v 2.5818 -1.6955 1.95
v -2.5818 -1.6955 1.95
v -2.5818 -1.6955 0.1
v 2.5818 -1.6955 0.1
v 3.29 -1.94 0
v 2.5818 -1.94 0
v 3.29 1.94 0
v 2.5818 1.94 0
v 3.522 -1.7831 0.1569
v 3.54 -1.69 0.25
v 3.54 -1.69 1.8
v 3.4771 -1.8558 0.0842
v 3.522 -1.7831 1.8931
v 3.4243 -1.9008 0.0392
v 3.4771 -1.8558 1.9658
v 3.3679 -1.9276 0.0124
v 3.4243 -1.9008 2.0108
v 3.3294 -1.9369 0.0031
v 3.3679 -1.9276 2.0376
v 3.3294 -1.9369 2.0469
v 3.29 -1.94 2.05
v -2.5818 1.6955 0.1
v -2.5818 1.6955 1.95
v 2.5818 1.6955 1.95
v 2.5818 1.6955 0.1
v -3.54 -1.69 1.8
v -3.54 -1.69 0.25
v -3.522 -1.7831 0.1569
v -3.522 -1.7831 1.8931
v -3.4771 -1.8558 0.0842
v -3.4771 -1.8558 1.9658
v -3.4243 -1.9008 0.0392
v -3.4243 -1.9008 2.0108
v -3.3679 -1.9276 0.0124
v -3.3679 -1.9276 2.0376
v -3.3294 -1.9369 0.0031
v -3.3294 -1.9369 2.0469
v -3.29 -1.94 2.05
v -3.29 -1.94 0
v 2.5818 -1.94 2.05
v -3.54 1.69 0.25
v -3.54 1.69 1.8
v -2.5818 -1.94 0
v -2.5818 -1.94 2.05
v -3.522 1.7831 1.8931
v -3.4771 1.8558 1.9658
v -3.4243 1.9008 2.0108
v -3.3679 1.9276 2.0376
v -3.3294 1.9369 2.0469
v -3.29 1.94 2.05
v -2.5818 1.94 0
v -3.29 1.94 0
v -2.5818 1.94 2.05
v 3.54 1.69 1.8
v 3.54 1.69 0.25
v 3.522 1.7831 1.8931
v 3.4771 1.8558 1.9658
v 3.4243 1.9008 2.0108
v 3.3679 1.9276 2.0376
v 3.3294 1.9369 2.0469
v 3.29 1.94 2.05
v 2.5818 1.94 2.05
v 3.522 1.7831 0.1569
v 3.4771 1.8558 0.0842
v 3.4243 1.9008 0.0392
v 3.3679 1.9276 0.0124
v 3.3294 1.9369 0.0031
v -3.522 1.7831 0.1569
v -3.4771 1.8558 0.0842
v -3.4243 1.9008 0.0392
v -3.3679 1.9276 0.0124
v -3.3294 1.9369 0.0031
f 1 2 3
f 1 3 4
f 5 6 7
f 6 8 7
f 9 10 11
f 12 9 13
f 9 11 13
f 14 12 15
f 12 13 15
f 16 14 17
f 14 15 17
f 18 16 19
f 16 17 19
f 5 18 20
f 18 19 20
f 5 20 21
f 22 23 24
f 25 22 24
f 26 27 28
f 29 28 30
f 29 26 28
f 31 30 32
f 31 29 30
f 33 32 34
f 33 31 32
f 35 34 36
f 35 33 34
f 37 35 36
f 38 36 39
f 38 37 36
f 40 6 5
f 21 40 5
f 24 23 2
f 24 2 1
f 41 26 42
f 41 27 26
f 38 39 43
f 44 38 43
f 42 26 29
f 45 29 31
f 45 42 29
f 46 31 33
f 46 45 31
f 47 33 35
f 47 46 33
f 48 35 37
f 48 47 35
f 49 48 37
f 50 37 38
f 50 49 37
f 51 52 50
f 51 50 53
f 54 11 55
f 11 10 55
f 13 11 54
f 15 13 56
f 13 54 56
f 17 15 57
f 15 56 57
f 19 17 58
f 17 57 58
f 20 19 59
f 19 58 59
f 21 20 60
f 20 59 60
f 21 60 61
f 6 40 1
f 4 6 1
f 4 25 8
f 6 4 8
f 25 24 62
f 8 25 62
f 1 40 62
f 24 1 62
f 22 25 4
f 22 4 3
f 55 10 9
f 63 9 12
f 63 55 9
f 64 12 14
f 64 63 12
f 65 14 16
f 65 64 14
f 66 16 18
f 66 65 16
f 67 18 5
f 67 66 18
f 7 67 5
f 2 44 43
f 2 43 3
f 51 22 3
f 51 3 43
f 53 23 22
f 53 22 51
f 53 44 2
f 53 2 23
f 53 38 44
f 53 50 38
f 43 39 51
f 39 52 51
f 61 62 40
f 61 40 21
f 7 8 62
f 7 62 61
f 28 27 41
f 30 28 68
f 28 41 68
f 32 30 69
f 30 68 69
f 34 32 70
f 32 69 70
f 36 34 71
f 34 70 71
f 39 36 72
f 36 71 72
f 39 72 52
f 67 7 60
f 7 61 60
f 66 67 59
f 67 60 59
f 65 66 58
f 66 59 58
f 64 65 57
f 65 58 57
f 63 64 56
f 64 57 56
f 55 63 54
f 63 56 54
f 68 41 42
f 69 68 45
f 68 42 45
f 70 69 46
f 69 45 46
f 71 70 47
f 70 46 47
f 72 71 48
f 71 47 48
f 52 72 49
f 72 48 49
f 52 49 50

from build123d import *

# Parameters (mm, degrees)
ESQUISSE1_W             = 7.08
ESQUISSE1_H             = 3.88
BOSS_EXTRU_1_DEPTH      = 2.05
ESQUISSE3_W             = 5.163612044
ESQUISSE3_H             = 0.48908098
ENL_V_MAT_EXTRU_1_DEPTH = 2.05
ESQUISSE4_W             = 5.163612044
ESQUISSE4_H             = 3.39091902
ENL_V_MAT_EXTRU_2_DEPTH = 0.1
ESQUISSE5_W             = 5.163612044
ESQUISSE5_H             = 3.39091902
ENL_V_MAT_EXTRU_3_DEPTH = 0.1
CONG_1_R                = 0.25


with BuildPart() as part:
    # Esquisse1 → Boss.-Extru.1 (new body)
    with BuildSketch(Plane.XY):
        Rectangle(ESQUISSE1_W, ESQUISSE1_H)
    extrude(amount=BOSS_EXTRU_1_DEPTH)

    # Esquisse3 → Enlèv. mat.-Extru.1 (cut)
    with BuildSketch(Plane.XY.offset(2.05)):
        with Locations((0, 1.94)):
            Rectangle(ESQUISSE3_W, ESQUISSE3_H)
        with Locations((0, -1.94)):
            Rectangle(ESQUISSE3_W, ESQUISSE3_H)
    extrude(amount=-ENL_V_MAT_EXTRU_1_DEPTH, mode=Mode.SUBTRACT)

    # Esquisse4 → Enlèv. mat.-Extru.2 (cut)
    with BuildSketch(Plane.XY.offset(2.05)):
        Rectangle(ESQUISSE4_W, ESQUISSE4_H)
    extrude(amount=-ENL_V_MAT_EXTRU_2_DEPTH, mode=Mode.SUBTRACT)

    # Esquisse5 → Enlèv. mat.-Extru.3 (cut)
    with BuildSketch(Plane(origin=(0, 0, 0), x_dir=(-1, 0, 0), z_dir=(0, 0, -1))):
        Rectangle(ESQUISSE5_W, ESQUISSE5_H)
    extrude(amount=-ENL_V_MAT_EXTRU_3_DEPTH, mode=Mode.SUBTRACT)

    # Congé1
    cong_1_edges = [part.edges().sort_by_distance(p)[0] for p in [
        (-3.54, 0, 2.05),
        (3.54, 0, 2.05),
        (-3.54, 0, 0),
        (3.54, 0, 0),
        (3.54, -1.94, 1.025),
        (-3.54, -1.94, 1.025),
        (-3.54, 1.94, 1.025),
        (3.54, 1.94, 1.025),
    ]]
    fillet(cong_1_edges, radius=CONG_1_R)


solid = part.part
